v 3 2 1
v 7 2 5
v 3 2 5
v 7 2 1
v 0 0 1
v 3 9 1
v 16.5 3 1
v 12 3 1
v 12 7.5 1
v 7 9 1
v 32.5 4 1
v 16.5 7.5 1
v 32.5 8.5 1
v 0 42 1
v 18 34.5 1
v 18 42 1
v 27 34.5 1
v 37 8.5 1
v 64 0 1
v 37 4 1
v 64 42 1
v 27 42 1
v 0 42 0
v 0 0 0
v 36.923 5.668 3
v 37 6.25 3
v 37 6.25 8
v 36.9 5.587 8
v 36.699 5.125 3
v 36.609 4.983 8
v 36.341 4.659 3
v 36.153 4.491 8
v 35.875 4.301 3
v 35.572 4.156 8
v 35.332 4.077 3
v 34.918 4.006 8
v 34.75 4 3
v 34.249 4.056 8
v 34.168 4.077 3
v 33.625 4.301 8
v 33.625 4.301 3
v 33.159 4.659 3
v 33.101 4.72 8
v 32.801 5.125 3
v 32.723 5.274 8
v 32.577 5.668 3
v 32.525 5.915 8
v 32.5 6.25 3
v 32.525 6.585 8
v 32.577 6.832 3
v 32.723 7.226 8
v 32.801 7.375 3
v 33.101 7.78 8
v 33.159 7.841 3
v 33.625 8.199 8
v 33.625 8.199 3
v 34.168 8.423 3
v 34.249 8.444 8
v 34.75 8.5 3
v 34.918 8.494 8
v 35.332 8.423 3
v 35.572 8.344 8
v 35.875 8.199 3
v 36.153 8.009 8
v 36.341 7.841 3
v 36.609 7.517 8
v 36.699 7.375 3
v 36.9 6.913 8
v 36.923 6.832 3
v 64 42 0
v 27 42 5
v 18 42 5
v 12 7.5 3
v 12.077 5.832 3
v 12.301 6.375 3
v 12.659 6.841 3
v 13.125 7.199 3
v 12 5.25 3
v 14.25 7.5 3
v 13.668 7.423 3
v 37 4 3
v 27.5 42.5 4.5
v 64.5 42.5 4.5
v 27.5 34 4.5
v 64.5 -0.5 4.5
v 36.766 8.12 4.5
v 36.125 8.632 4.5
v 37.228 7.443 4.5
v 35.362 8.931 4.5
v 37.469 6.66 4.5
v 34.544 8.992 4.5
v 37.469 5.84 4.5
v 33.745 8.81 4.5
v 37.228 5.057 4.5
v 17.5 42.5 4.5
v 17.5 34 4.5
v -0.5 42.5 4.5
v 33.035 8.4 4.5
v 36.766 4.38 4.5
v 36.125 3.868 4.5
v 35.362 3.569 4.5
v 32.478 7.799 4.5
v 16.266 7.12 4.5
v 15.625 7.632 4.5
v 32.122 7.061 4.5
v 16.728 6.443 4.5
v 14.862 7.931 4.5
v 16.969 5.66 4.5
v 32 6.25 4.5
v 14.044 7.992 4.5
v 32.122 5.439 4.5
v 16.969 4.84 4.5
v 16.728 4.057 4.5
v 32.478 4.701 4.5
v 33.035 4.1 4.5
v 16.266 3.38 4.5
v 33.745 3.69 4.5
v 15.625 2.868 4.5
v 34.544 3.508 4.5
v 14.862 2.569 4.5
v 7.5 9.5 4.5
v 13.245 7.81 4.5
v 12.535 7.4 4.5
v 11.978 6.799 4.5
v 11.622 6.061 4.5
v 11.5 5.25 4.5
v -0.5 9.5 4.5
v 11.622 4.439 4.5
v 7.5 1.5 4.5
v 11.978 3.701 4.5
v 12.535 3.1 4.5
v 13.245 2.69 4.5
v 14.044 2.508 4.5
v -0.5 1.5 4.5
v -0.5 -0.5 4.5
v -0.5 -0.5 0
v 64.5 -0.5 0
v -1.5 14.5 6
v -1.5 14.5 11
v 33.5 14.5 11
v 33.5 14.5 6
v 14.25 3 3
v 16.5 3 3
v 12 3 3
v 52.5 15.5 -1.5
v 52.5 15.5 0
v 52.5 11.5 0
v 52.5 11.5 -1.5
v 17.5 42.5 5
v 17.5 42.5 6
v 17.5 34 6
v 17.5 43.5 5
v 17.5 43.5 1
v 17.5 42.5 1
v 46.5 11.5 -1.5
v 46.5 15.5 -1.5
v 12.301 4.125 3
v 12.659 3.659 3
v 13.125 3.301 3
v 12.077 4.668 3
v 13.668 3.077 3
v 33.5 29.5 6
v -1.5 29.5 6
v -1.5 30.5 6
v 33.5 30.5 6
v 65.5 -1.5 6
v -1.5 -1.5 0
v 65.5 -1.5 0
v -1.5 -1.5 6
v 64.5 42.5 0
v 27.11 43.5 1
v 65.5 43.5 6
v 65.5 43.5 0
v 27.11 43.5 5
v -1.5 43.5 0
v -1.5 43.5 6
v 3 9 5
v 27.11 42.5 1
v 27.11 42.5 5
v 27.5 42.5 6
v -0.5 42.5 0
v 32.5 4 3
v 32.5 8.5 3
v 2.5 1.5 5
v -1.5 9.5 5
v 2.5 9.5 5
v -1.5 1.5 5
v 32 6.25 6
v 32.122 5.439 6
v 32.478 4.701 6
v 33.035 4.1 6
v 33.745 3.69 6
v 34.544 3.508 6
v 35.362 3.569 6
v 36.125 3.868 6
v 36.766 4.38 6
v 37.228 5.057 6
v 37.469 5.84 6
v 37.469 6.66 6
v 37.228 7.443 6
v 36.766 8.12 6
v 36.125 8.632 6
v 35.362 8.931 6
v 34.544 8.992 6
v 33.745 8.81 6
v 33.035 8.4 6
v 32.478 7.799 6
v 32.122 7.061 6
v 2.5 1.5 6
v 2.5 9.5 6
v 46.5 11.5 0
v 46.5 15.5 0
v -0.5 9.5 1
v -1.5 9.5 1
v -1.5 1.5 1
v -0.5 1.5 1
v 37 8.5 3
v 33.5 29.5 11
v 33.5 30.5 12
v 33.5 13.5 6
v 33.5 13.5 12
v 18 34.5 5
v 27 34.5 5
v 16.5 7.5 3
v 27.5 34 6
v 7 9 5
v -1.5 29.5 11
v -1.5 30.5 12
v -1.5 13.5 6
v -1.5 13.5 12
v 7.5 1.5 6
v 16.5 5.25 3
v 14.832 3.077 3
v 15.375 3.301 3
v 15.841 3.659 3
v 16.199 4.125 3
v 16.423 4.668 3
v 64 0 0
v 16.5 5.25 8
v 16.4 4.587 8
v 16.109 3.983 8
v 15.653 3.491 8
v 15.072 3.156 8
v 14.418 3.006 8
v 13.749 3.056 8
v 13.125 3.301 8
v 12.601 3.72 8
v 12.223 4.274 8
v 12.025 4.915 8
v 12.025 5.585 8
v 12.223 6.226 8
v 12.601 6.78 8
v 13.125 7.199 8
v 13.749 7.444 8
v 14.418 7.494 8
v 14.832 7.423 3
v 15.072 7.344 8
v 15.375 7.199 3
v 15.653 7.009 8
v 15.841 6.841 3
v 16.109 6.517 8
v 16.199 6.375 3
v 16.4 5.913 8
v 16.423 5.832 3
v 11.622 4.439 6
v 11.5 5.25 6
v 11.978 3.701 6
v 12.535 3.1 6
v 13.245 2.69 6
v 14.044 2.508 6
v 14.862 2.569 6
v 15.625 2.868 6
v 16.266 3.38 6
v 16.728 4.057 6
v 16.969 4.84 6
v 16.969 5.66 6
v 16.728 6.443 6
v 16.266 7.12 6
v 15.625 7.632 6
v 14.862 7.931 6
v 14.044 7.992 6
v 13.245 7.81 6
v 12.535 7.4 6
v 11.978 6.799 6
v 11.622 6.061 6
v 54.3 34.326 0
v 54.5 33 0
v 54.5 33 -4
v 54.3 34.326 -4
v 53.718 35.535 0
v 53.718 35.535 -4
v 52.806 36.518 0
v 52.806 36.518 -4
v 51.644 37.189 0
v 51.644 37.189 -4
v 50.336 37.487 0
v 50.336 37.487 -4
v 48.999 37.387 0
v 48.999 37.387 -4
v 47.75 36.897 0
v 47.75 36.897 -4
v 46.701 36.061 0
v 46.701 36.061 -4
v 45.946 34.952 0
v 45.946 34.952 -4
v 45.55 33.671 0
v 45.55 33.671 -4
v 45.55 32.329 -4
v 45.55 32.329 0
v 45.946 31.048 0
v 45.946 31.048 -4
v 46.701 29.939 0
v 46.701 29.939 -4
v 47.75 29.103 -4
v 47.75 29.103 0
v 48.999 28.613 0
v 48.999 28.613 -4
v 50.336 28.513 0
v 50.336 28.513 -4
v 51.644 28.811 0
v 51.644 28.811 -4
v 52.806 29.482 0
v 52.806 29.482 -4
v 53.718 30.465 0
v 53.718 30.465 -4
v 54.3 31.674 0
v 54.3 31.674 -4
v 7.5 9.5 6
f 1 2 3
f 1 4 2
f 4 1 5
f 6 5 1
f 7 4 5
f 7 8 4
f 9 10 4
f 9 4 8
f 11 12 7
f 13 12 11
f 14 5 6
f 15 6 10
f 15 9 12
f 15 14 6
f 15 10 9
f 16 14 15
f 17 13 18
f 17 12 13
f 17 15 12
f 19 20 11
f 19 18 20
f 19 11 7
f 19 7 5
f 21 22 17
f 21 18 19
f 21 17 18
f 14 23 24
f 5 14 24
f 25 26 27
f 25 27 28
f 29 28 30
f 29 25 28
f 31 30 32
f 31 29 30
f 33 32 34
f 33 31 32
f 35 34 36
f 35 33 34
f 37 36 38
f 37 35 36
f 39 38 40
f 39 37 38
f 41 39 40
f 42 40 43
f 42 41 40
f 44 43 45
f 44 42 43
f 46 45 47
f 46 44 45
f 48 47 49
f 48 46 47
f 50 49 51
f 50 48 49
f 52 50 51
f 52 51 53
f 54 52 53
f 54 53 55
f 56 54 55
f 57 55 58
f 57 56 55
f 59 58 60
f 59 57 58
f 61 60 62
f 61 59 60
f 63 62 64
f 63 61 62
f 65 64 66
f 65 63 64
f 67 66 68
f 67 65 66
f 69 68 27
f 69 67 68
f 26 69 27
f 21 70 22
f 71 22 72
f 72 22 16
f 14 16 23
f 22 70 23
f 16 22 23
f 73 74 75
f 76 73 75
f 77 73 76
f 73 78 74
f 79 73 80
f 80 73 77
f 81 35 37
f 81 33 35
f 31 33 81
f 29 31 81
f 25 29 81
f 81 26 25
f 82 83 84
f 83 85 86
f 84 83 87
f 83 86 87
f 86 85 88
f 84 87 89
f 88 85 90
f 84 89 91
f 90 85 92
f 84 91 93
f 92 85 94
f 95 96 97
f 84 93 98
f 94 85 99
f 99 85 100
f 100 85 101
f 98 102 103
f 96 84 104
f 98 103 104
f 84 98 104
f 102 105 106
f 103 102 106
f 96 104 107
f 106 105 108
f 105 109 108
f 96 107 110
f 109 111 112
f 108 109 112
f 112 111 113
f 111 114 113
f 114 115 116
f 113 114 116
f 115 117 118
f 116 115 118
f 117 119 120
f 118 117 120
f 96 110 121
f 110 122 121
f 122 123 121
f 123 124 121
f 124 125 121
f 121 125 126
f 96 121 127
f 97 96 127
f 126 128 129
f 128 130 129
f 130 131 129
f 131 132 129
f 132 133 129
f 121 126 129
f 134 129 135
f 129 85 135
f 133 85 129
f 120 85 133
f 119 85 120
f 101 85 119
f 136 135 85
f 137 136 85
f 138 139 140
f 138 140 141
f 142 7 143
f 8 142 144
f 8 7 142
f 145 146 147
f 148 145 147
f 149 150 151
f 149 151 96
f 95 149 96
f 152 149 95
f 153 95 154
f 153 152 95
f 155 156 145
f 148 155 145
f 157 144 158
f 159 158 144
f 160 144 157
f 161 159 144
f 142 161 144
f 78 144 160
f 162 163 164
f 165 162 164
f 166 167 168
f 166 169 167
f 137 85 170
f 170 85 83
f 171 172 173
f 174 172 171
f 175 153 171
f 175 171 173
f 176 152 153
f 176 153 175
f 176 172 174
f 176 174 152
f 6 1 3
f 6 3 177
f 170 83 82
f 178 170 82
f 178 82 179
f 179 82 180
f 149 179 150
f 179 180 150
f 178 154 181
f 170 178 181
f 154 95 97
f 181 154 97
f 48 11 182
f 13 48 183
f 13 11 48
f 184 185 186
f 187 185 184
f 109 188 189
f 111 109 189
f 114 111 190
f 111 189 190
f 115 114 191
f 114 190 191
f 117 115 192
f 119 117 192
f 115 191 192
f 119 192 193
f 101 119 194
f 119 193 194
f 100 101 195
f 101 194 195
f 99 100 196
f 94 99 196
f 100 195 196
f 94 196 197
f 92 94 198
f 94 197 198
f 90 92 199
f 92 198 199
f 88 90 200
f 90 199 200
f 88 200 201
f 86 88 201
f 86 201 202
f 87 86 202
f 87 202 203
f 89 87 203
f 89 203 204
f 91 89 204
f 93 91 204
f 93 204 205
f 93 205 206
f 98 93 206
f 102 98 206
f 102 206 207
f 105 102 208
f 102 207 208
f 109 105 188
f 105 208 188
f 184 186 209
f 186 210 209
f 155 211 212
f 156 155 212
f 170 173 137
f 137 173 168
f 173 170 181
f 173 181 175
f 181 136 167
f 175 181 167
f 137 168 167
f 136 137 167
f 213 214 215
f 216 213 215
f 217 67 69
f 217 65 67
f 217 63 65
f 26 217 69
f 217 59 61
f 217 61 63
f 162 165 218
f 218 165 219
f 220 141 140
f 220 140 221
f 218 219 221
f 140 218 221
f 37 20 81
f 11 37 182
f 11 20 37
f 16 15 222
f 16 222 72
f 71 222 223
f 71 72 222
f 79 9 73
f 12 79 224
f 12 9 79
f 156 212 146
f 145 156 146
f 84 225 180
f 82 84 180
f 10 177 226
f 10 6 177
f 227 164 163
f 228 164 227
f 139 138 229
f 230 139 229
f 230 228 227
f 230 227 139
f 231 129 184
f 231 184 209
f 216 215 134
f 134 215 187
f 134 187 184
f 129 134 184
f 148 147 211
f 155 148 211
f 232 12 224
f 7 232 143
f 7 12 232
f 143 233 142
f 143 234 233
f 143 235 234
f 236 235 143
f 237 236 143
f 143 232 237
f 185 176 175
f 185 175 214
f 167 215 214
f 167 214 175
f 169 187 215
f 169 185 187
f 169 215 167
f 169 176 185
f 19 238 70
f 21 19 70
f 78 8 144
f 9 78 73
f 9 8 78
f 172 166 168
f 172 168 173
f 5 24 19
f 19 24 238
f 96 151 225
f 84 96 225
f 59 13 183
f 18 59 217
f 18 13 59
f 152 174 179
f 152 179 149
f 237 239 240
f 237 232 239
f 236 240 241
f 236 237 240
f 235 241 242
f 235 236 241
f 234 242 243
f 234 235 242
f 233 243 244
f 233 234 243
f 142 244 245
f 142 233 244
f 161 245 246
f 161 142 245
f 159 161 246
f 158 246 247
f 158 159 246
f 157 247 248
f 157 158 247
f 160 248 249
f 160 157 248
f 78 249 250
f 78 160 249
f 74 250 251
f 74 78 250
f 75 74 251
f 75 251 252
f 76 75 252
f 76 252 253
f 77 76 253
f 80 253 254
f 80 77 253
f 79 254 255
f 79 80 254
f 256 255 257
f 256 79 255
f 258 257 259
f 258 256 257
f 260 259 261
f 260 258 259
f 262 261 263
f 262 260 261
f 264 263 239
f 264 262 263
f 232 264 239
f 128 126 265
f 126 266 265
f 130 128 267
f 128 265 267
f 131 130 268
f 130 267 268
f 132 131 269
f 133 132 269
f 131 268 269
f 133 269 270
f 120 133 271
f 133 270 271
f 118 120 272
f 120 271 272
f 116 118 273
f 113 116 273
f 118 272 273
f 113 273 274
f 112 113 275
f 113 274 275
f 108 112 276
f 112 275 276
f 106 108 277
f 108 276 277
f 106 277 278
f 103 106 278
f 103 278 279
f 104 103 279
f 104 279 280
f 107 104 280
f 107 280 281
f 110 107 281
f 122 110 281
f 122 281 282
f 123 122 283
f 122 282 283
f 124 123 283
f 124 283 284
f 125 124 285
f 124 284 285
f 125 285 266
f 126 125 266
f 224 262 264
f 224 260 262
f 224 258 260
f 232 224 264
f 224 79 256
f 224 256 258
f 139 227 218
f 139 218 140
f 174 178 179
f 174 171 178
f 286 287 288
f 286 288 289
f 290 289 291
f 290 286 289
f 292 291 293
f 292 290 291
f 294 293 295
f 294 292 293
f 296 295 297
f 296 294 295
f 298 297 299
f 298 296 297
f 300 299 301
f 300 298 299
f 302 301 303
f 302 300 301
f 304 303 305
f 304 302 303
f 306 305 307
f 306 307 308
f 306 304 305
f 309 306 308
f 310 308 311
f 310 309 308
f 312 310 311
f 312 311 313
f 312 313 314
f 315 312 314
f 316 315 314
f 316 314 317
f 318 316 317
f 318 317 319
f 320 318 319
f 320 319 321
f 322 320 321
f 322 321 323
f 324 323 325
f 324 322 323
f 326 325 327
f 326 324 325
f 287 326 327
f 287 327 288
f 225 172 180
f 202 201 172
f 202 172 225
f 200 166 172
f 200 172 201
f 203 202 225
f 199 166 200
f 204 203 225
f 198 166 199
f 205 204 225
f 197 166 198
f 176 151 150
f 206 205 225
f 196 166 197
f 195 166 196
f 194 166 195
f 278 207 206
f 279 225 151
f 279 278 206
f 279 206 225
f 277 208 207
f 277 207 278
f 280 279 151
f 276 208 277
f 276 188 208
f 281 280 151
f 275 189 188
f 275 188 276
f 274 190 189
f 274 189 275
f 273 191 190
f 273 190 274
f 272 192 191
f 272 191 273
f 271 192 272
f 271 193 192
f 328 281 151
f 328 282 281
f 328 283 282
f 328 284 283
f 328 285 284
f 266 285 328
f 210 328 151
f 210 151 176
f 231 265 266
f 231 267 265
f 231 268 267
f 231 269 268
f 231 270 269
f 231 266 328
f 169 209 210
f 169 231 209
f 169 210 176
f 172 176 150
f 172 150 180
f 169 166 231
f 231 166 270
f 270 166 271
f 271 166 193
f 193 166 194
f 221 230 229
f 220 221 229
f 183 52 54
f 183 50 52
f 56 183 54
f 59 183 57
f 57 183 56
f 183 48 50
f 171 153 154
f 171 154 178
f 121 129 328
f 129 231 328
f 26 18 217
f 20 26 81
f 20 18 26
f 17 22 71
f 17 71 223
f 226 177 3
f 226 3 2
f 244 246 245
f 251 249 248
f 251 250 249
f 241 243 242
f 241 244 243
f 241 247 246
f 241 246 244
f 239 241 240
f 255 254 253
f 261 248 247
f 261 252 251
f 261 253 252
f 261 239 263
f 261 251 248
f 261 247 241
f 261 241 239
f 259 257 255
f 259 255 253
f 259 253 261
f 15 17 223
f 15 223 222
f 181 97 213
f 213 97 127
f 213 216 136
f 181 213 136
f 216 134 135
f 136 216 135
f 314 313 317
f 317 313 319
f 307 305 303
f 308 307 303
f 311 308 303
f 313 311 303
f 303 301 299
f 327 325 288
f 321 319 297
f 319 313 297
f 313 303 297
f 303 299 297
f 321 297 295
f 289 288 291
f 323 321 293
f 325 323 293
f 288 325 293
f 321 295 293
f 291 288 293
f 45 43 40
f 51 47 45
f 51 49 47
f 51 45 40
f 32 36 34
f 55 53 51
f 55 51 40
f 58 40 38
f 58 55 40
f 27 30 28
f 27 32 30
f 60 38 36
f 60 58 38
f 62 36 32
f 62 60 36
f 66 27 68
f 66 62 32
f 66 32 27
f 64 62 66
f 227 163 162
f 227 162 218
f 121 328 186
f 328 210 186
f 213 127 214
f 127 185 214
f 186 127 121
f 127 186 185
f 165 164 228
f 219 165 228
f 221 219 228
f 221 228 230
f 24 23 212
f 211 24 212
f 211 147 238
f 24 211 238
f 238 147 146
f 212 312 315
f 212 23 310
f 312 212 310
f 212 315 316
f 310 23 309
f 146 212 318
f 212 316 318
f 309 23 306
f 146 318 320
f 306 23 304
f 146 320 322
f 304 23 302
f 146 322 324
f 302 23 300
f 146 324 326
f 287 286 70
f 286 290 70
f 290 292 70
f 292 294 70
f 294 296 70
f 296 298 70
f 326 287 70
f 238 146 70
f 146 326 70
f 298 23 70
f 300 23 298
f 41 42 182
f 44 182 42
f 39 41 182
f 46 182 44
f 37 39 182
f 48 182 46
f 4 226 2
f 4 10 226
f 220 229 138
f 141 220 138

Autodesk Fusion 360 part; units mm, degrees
sketch "Sketch1" plane through (0, 0, 0) normal (0, 0, 1) x (1, 0, 0)
  line L0 (0, 0) -> (64, 0)
  line L1 (64, 0) -> (64, 42)
  line L2 (64, 42) -> (0, 42)
  line L3 (0, 42) -> (0, 0)
  line L4 (18, 42) -> (27, 42)
  line L5 (27, 42) -> (27, 34.5)
  line L6 (27, 34.5) -> (18, 34.5)
  line L7 (18, 34.5) -> (18, 42)
  line L8 (3, 9) -> (7, 9)
  line L9 (7, 9) -> (7, 2)
  line L10 (7, 2) -> (3, 2)
  line L11 (3, 2) -> (3, 9)
  circle A0 centre (14.25, 5.25) radius 2.25
  circle A1 centre (34.75, 6.25) radius 2.25
  circle A2 centre (50, 33) radius 4.5
  line L12 (46.5, 15.5) -> (52.5, 15.5)
  line L13 (52.5, 15.5) -> (52.5, 11.5)
  line L14 (52.5, 11.5) -> (46.5, 11.5)
  line L15 (46.5, 11.5) -> (46.5, 15.5)
  line L16 (12, 7.5) -> (16.5, 7.5)
  line L17 (16.5, 7.5) -> (16.5, 3)
  line L18 (16.5, 3) -> (12, 3)
  line L19 (12, 3) -> (12, 7.5)
  line L20 (32.5, 8.5) -> (37, 8.5)
  line L21 (37, 8.5) -> (37, 4)
  line L22 (37, 4) -> (32.5, 4)
  line L23 (32.5, 4) -> (32.5, 8.5)
  dimension "d1" = 64
  dimension "d2" = 42
  dimension "d3" = 18
  dimension "d4" = 9
  dimension "d5" = 7.5
  dimension "d6" = 4
  dimension "d7" = 7
  dimension "d8" = 4.5
  dimension "d9" = 9
  dimension "d10" = 6
  dimension "d11" = 4
  dimension "d12" = 3
  dimension "d13" = 2
  dimension "d14" = 3
  dimension "d15" = 5
  dimension "d16" = 4
  dimension "d17" = 16
  dimension "d18" = 9
  dimension "d19" = 14
  dimension "d20" = 11.5
  dimension "d21" = 11.5
extrude "Extrude1" add sketch "Sketch1" along normal blind 1 contours L0 L1 L2 L3 L5 L6 L7 | L2 L4 L5 L6 L7 | L8 L9 L10 L11 | A0 | A0 L17 L18 | A0 L16 L17 | A0 L16 L19 | A0 L18 L19 | A1 | A1 L21 L22 | A1 L20 L21 | A1 L20 L23 | A1 L22 L23 | A2 | L12 L13 L14 L15 makes body 1
extrude "Extrude2" add sketch "Sketch1" along normal blind 5 contours L2 L4 L5 L6 L7 bodies 1
extrude "Extrude3" add sketch "Sketch1" along normal blind 5 contours L8 L9 L10 L11 bodies 1
extrude "Extrude4" add sketch "Sketch1" along normal blind 3 contours A0 | A0 L17 L18 | A0 L16 L17 | A0 L16 L19 | A0 L18 L19 | A1 | A1 L21 L22 | A1 L20 L21 | A1 L20 L23 | A1 L22 L23 bodies 1
extrude "Extrude5" add sketch "Sketch1" along normal blind 5 from surface at 3 contours A0 | A1 bodies 1
extrude "Extrude6" add sketch "Sketch1" against normal blind 4 contours A2 bodies 1
extrude "Extrude7" add sketch "Sketch1" against normal blind 1.5 contours L12 L13 L14 L15 bodies 1
sketch "Sketch2" plane through (0, 0, 5) normal (0, 0, 1) x (-1, 0, 0)
  line L0 (-18, -34.5) -> (-27, -34.5)
  line L1 (-27, -34.5) -> (-27, -42)
  line L2 (-27, -42) -> (-18, -42)
  line L3 (-18, -42) -> (-18, -34.5)
  circle A0 centre (-34.75, -6.25) radius 2.25
  circle A1 centre (-14.25, -5.25) radius 2.25
  line L4 (-7, -9) -> (-3, -9)
  line L5 (-3, -9) -> (-3, -2)
  line L6 (-3, -2) -> (-7, -2)
  line L7 (-7, -2) -> (-7, -9)
  line L8 (-18, -42) -> (-18, -34.5)
  line L9 (-18, -34.5) -> (-27, -34.5)
  line L10 (-27, -34.5) -> (-27, -42)
  line L11 (-27, -42) -> (-18, -42)
  line L12 (-64, -42) -> (0, -42)
  line L13 (-64, 0) -> (-64, -42)
  line L14 (0, 0) -> (-64, 0)
  line L15 (0, -42) -> (0, 0)
  line L16 (0.5, 0.5) -> (-64.5, 0.5)
  line L17 (-64.5, 0.5) -> (-64.5, -42.5)
  line L18 (-64.5, -42.5) -> (0.5, -42.5)
  line L19 (0.5, -42.5) -> (0.5, 0.5)
  line L20 (1.5, 1.5) -> (-65.5, 1.5)
  line L21 (-65.5, 1.5) -> (-65.5, -43.5)
  line L22 (-65.5, -43.5) -> (1.5, -43.5)
  line L23 (1.5, -43.5) -> (1.5, 1.5)
  line L24 (-27.5, -42.5) -> (-17.5, -42.5)
  line L25 (-17.5, -42.5) -> (-17.5, -34)
  line L26 (-17.5, -34) -> (-27.5, -34)
  line L27 (-27.5, -34) -> (-27.5, -42.5)
  line L28 (-2.5, -1.5) -> (-7.5, -1.5)
  line L29 (-7.5, -1.5) -> (-7.5, -9.5)
  line L30 (-7.5, -9.5) -> (-2.5, -9.5)
  line L31 (-2.5, -9.5) -> (-2.5, -1.5)
  circle A2 centre (-14.25, -5.25) radius 2.75
  circle A3 centre (-34.75, -6.25) radius 2.75
  dimension "d37" = 0.5
  dimension "d38" = 1.5
  dimension "d39" = 0.5
  dimension "d42" = 0.5
  dimension "d43" = 0.5
  dimension "d44" = 0.5
extrude "Extrude8" add sketch "Sketch2" against normal up to surface (6 mm away) from surface at 1 separate body contours L20 L21 L22 L23 makes body 2
extrude "Extrude9" add sketch "Sketch2" against normal blind 1.5 from surface at 1 contours L12 L13 L14 L15 L25 L26 L27 | L12 L13 L14 L15 L16 L17 L18 L19 L25 L27 bodies 2
sketch "Sketch3" plane through (-1.5, 0, 0) normal (-1, 0, 0) x (0, -1, 0)
  line L0 (-43.5, 0) -> (1.5, 0)
  line L1 (1.5, 0) -> (1.5, 6)
  line L2 (1.5, 6) -> (-43.5, 6)
  line L3 (-43.5, 6) -> (-43.5, 0)
  line L4 (-9.5, 5) -> (-9.5, 1)
  line L5 (-9.5, 1) -> (-1.5, 1)
  line L6 (-1.5, 1) -> (-1.5, 5)
  line L7 (-9.5, 5) -> (-1.5, 5)
  point P0 (-9.5, 4.5)
  point P1 (-1.5, 4.5)
  point P2 (-2, 5)
  point P3 (-9, 5)
  dimension "d49" = 1
extrude "Extrude10" cut sketch "Sketch3" against normal up to surface (4 mm away) contours L4 L5 L6 L7 bodies 2
sketch "Sketch4" plane through (0, 43.5, 0) normal (0, 1, 0) x (-1, 0, 0)
  line L0 (-65.5, 0) -> (1.5, 0)
  line L1 (1.5, 0) -> (1.5, 6)
  line L2 (1.5, 6) -> (-65.5, 6)
  line L3 (-65.5, 6) -> (-65.5, 0)
  line L4 (-27.11, 5) -> (-17.5, 5)
  line L5 (-17.5, 5) -> (-17.5, 1)
  line L6 (-17.5, 1) -> (-27.11, 1)
  line L7 (-27.11, 1) -> (-27.11, 5)
  line L8 (-65.5, 5) -> (1.5, 5)
  point P0 (-17.5, 5)
  dimension "d52" = 1
  dimension "d55" = 1
extrude "Extrude11" cut sketch "Sketch4" against normal up to surface (1 mm away) contours L4 L5 L6 L7 L8 bodies 2
sketch "Sketch5" plane through (-1.5, 0, 0) normal (-1, 0, 0) x (0, -1, 0)
  line L0 (-9.5, 1) -> (-9.5, 5)
  line L1 (-9.5, 5) -> (-1.5, 5)
  line L2 (-1.5, 5) -> (-1.5, 1)
  line L3 (-1.5, 1) -> (-9.5, 1)
  line L4 (-43.5, 0) -> (1.5, 0)
  line L5 (1.5, 0) -> (1.5, 6)
  line L6 (1.5, 6) -> (-43.5, 6)
  line L7 (-43.5, 6) -> (-43.5, 0)
  line L8 (-30.5, 12) -> (-13.5, 12)
  line L9 (1.5, 6) -> (-30.5, 6)
  line L10 (-30.5, 6) -> (-30.5, 12)
  line L11 (-29.5, 11) -> (-14.5, 11)
  line L12 (-14.5, 11) -> (-14.5, 6)
  line L13 (-14.5, 6) -> (-29.5, 6)
  line L14 (-29.5, 6) -> (-29.5, 11)
  line L15 (-13.5, 12) -> (-13.5, 6)
  dimension "d56" = 15
  dimension "d59" = 1
  dimension "d60" = 5
  dimension "d61" = 1
  dimension "d62" = 1
  dimension "d63" = 15
extrude "Extrude12" add sketch "Sketch5" against normal blind 35 separate body contours L6 L8 L9 L10 L11 L12 L14 L15 makes body 3
